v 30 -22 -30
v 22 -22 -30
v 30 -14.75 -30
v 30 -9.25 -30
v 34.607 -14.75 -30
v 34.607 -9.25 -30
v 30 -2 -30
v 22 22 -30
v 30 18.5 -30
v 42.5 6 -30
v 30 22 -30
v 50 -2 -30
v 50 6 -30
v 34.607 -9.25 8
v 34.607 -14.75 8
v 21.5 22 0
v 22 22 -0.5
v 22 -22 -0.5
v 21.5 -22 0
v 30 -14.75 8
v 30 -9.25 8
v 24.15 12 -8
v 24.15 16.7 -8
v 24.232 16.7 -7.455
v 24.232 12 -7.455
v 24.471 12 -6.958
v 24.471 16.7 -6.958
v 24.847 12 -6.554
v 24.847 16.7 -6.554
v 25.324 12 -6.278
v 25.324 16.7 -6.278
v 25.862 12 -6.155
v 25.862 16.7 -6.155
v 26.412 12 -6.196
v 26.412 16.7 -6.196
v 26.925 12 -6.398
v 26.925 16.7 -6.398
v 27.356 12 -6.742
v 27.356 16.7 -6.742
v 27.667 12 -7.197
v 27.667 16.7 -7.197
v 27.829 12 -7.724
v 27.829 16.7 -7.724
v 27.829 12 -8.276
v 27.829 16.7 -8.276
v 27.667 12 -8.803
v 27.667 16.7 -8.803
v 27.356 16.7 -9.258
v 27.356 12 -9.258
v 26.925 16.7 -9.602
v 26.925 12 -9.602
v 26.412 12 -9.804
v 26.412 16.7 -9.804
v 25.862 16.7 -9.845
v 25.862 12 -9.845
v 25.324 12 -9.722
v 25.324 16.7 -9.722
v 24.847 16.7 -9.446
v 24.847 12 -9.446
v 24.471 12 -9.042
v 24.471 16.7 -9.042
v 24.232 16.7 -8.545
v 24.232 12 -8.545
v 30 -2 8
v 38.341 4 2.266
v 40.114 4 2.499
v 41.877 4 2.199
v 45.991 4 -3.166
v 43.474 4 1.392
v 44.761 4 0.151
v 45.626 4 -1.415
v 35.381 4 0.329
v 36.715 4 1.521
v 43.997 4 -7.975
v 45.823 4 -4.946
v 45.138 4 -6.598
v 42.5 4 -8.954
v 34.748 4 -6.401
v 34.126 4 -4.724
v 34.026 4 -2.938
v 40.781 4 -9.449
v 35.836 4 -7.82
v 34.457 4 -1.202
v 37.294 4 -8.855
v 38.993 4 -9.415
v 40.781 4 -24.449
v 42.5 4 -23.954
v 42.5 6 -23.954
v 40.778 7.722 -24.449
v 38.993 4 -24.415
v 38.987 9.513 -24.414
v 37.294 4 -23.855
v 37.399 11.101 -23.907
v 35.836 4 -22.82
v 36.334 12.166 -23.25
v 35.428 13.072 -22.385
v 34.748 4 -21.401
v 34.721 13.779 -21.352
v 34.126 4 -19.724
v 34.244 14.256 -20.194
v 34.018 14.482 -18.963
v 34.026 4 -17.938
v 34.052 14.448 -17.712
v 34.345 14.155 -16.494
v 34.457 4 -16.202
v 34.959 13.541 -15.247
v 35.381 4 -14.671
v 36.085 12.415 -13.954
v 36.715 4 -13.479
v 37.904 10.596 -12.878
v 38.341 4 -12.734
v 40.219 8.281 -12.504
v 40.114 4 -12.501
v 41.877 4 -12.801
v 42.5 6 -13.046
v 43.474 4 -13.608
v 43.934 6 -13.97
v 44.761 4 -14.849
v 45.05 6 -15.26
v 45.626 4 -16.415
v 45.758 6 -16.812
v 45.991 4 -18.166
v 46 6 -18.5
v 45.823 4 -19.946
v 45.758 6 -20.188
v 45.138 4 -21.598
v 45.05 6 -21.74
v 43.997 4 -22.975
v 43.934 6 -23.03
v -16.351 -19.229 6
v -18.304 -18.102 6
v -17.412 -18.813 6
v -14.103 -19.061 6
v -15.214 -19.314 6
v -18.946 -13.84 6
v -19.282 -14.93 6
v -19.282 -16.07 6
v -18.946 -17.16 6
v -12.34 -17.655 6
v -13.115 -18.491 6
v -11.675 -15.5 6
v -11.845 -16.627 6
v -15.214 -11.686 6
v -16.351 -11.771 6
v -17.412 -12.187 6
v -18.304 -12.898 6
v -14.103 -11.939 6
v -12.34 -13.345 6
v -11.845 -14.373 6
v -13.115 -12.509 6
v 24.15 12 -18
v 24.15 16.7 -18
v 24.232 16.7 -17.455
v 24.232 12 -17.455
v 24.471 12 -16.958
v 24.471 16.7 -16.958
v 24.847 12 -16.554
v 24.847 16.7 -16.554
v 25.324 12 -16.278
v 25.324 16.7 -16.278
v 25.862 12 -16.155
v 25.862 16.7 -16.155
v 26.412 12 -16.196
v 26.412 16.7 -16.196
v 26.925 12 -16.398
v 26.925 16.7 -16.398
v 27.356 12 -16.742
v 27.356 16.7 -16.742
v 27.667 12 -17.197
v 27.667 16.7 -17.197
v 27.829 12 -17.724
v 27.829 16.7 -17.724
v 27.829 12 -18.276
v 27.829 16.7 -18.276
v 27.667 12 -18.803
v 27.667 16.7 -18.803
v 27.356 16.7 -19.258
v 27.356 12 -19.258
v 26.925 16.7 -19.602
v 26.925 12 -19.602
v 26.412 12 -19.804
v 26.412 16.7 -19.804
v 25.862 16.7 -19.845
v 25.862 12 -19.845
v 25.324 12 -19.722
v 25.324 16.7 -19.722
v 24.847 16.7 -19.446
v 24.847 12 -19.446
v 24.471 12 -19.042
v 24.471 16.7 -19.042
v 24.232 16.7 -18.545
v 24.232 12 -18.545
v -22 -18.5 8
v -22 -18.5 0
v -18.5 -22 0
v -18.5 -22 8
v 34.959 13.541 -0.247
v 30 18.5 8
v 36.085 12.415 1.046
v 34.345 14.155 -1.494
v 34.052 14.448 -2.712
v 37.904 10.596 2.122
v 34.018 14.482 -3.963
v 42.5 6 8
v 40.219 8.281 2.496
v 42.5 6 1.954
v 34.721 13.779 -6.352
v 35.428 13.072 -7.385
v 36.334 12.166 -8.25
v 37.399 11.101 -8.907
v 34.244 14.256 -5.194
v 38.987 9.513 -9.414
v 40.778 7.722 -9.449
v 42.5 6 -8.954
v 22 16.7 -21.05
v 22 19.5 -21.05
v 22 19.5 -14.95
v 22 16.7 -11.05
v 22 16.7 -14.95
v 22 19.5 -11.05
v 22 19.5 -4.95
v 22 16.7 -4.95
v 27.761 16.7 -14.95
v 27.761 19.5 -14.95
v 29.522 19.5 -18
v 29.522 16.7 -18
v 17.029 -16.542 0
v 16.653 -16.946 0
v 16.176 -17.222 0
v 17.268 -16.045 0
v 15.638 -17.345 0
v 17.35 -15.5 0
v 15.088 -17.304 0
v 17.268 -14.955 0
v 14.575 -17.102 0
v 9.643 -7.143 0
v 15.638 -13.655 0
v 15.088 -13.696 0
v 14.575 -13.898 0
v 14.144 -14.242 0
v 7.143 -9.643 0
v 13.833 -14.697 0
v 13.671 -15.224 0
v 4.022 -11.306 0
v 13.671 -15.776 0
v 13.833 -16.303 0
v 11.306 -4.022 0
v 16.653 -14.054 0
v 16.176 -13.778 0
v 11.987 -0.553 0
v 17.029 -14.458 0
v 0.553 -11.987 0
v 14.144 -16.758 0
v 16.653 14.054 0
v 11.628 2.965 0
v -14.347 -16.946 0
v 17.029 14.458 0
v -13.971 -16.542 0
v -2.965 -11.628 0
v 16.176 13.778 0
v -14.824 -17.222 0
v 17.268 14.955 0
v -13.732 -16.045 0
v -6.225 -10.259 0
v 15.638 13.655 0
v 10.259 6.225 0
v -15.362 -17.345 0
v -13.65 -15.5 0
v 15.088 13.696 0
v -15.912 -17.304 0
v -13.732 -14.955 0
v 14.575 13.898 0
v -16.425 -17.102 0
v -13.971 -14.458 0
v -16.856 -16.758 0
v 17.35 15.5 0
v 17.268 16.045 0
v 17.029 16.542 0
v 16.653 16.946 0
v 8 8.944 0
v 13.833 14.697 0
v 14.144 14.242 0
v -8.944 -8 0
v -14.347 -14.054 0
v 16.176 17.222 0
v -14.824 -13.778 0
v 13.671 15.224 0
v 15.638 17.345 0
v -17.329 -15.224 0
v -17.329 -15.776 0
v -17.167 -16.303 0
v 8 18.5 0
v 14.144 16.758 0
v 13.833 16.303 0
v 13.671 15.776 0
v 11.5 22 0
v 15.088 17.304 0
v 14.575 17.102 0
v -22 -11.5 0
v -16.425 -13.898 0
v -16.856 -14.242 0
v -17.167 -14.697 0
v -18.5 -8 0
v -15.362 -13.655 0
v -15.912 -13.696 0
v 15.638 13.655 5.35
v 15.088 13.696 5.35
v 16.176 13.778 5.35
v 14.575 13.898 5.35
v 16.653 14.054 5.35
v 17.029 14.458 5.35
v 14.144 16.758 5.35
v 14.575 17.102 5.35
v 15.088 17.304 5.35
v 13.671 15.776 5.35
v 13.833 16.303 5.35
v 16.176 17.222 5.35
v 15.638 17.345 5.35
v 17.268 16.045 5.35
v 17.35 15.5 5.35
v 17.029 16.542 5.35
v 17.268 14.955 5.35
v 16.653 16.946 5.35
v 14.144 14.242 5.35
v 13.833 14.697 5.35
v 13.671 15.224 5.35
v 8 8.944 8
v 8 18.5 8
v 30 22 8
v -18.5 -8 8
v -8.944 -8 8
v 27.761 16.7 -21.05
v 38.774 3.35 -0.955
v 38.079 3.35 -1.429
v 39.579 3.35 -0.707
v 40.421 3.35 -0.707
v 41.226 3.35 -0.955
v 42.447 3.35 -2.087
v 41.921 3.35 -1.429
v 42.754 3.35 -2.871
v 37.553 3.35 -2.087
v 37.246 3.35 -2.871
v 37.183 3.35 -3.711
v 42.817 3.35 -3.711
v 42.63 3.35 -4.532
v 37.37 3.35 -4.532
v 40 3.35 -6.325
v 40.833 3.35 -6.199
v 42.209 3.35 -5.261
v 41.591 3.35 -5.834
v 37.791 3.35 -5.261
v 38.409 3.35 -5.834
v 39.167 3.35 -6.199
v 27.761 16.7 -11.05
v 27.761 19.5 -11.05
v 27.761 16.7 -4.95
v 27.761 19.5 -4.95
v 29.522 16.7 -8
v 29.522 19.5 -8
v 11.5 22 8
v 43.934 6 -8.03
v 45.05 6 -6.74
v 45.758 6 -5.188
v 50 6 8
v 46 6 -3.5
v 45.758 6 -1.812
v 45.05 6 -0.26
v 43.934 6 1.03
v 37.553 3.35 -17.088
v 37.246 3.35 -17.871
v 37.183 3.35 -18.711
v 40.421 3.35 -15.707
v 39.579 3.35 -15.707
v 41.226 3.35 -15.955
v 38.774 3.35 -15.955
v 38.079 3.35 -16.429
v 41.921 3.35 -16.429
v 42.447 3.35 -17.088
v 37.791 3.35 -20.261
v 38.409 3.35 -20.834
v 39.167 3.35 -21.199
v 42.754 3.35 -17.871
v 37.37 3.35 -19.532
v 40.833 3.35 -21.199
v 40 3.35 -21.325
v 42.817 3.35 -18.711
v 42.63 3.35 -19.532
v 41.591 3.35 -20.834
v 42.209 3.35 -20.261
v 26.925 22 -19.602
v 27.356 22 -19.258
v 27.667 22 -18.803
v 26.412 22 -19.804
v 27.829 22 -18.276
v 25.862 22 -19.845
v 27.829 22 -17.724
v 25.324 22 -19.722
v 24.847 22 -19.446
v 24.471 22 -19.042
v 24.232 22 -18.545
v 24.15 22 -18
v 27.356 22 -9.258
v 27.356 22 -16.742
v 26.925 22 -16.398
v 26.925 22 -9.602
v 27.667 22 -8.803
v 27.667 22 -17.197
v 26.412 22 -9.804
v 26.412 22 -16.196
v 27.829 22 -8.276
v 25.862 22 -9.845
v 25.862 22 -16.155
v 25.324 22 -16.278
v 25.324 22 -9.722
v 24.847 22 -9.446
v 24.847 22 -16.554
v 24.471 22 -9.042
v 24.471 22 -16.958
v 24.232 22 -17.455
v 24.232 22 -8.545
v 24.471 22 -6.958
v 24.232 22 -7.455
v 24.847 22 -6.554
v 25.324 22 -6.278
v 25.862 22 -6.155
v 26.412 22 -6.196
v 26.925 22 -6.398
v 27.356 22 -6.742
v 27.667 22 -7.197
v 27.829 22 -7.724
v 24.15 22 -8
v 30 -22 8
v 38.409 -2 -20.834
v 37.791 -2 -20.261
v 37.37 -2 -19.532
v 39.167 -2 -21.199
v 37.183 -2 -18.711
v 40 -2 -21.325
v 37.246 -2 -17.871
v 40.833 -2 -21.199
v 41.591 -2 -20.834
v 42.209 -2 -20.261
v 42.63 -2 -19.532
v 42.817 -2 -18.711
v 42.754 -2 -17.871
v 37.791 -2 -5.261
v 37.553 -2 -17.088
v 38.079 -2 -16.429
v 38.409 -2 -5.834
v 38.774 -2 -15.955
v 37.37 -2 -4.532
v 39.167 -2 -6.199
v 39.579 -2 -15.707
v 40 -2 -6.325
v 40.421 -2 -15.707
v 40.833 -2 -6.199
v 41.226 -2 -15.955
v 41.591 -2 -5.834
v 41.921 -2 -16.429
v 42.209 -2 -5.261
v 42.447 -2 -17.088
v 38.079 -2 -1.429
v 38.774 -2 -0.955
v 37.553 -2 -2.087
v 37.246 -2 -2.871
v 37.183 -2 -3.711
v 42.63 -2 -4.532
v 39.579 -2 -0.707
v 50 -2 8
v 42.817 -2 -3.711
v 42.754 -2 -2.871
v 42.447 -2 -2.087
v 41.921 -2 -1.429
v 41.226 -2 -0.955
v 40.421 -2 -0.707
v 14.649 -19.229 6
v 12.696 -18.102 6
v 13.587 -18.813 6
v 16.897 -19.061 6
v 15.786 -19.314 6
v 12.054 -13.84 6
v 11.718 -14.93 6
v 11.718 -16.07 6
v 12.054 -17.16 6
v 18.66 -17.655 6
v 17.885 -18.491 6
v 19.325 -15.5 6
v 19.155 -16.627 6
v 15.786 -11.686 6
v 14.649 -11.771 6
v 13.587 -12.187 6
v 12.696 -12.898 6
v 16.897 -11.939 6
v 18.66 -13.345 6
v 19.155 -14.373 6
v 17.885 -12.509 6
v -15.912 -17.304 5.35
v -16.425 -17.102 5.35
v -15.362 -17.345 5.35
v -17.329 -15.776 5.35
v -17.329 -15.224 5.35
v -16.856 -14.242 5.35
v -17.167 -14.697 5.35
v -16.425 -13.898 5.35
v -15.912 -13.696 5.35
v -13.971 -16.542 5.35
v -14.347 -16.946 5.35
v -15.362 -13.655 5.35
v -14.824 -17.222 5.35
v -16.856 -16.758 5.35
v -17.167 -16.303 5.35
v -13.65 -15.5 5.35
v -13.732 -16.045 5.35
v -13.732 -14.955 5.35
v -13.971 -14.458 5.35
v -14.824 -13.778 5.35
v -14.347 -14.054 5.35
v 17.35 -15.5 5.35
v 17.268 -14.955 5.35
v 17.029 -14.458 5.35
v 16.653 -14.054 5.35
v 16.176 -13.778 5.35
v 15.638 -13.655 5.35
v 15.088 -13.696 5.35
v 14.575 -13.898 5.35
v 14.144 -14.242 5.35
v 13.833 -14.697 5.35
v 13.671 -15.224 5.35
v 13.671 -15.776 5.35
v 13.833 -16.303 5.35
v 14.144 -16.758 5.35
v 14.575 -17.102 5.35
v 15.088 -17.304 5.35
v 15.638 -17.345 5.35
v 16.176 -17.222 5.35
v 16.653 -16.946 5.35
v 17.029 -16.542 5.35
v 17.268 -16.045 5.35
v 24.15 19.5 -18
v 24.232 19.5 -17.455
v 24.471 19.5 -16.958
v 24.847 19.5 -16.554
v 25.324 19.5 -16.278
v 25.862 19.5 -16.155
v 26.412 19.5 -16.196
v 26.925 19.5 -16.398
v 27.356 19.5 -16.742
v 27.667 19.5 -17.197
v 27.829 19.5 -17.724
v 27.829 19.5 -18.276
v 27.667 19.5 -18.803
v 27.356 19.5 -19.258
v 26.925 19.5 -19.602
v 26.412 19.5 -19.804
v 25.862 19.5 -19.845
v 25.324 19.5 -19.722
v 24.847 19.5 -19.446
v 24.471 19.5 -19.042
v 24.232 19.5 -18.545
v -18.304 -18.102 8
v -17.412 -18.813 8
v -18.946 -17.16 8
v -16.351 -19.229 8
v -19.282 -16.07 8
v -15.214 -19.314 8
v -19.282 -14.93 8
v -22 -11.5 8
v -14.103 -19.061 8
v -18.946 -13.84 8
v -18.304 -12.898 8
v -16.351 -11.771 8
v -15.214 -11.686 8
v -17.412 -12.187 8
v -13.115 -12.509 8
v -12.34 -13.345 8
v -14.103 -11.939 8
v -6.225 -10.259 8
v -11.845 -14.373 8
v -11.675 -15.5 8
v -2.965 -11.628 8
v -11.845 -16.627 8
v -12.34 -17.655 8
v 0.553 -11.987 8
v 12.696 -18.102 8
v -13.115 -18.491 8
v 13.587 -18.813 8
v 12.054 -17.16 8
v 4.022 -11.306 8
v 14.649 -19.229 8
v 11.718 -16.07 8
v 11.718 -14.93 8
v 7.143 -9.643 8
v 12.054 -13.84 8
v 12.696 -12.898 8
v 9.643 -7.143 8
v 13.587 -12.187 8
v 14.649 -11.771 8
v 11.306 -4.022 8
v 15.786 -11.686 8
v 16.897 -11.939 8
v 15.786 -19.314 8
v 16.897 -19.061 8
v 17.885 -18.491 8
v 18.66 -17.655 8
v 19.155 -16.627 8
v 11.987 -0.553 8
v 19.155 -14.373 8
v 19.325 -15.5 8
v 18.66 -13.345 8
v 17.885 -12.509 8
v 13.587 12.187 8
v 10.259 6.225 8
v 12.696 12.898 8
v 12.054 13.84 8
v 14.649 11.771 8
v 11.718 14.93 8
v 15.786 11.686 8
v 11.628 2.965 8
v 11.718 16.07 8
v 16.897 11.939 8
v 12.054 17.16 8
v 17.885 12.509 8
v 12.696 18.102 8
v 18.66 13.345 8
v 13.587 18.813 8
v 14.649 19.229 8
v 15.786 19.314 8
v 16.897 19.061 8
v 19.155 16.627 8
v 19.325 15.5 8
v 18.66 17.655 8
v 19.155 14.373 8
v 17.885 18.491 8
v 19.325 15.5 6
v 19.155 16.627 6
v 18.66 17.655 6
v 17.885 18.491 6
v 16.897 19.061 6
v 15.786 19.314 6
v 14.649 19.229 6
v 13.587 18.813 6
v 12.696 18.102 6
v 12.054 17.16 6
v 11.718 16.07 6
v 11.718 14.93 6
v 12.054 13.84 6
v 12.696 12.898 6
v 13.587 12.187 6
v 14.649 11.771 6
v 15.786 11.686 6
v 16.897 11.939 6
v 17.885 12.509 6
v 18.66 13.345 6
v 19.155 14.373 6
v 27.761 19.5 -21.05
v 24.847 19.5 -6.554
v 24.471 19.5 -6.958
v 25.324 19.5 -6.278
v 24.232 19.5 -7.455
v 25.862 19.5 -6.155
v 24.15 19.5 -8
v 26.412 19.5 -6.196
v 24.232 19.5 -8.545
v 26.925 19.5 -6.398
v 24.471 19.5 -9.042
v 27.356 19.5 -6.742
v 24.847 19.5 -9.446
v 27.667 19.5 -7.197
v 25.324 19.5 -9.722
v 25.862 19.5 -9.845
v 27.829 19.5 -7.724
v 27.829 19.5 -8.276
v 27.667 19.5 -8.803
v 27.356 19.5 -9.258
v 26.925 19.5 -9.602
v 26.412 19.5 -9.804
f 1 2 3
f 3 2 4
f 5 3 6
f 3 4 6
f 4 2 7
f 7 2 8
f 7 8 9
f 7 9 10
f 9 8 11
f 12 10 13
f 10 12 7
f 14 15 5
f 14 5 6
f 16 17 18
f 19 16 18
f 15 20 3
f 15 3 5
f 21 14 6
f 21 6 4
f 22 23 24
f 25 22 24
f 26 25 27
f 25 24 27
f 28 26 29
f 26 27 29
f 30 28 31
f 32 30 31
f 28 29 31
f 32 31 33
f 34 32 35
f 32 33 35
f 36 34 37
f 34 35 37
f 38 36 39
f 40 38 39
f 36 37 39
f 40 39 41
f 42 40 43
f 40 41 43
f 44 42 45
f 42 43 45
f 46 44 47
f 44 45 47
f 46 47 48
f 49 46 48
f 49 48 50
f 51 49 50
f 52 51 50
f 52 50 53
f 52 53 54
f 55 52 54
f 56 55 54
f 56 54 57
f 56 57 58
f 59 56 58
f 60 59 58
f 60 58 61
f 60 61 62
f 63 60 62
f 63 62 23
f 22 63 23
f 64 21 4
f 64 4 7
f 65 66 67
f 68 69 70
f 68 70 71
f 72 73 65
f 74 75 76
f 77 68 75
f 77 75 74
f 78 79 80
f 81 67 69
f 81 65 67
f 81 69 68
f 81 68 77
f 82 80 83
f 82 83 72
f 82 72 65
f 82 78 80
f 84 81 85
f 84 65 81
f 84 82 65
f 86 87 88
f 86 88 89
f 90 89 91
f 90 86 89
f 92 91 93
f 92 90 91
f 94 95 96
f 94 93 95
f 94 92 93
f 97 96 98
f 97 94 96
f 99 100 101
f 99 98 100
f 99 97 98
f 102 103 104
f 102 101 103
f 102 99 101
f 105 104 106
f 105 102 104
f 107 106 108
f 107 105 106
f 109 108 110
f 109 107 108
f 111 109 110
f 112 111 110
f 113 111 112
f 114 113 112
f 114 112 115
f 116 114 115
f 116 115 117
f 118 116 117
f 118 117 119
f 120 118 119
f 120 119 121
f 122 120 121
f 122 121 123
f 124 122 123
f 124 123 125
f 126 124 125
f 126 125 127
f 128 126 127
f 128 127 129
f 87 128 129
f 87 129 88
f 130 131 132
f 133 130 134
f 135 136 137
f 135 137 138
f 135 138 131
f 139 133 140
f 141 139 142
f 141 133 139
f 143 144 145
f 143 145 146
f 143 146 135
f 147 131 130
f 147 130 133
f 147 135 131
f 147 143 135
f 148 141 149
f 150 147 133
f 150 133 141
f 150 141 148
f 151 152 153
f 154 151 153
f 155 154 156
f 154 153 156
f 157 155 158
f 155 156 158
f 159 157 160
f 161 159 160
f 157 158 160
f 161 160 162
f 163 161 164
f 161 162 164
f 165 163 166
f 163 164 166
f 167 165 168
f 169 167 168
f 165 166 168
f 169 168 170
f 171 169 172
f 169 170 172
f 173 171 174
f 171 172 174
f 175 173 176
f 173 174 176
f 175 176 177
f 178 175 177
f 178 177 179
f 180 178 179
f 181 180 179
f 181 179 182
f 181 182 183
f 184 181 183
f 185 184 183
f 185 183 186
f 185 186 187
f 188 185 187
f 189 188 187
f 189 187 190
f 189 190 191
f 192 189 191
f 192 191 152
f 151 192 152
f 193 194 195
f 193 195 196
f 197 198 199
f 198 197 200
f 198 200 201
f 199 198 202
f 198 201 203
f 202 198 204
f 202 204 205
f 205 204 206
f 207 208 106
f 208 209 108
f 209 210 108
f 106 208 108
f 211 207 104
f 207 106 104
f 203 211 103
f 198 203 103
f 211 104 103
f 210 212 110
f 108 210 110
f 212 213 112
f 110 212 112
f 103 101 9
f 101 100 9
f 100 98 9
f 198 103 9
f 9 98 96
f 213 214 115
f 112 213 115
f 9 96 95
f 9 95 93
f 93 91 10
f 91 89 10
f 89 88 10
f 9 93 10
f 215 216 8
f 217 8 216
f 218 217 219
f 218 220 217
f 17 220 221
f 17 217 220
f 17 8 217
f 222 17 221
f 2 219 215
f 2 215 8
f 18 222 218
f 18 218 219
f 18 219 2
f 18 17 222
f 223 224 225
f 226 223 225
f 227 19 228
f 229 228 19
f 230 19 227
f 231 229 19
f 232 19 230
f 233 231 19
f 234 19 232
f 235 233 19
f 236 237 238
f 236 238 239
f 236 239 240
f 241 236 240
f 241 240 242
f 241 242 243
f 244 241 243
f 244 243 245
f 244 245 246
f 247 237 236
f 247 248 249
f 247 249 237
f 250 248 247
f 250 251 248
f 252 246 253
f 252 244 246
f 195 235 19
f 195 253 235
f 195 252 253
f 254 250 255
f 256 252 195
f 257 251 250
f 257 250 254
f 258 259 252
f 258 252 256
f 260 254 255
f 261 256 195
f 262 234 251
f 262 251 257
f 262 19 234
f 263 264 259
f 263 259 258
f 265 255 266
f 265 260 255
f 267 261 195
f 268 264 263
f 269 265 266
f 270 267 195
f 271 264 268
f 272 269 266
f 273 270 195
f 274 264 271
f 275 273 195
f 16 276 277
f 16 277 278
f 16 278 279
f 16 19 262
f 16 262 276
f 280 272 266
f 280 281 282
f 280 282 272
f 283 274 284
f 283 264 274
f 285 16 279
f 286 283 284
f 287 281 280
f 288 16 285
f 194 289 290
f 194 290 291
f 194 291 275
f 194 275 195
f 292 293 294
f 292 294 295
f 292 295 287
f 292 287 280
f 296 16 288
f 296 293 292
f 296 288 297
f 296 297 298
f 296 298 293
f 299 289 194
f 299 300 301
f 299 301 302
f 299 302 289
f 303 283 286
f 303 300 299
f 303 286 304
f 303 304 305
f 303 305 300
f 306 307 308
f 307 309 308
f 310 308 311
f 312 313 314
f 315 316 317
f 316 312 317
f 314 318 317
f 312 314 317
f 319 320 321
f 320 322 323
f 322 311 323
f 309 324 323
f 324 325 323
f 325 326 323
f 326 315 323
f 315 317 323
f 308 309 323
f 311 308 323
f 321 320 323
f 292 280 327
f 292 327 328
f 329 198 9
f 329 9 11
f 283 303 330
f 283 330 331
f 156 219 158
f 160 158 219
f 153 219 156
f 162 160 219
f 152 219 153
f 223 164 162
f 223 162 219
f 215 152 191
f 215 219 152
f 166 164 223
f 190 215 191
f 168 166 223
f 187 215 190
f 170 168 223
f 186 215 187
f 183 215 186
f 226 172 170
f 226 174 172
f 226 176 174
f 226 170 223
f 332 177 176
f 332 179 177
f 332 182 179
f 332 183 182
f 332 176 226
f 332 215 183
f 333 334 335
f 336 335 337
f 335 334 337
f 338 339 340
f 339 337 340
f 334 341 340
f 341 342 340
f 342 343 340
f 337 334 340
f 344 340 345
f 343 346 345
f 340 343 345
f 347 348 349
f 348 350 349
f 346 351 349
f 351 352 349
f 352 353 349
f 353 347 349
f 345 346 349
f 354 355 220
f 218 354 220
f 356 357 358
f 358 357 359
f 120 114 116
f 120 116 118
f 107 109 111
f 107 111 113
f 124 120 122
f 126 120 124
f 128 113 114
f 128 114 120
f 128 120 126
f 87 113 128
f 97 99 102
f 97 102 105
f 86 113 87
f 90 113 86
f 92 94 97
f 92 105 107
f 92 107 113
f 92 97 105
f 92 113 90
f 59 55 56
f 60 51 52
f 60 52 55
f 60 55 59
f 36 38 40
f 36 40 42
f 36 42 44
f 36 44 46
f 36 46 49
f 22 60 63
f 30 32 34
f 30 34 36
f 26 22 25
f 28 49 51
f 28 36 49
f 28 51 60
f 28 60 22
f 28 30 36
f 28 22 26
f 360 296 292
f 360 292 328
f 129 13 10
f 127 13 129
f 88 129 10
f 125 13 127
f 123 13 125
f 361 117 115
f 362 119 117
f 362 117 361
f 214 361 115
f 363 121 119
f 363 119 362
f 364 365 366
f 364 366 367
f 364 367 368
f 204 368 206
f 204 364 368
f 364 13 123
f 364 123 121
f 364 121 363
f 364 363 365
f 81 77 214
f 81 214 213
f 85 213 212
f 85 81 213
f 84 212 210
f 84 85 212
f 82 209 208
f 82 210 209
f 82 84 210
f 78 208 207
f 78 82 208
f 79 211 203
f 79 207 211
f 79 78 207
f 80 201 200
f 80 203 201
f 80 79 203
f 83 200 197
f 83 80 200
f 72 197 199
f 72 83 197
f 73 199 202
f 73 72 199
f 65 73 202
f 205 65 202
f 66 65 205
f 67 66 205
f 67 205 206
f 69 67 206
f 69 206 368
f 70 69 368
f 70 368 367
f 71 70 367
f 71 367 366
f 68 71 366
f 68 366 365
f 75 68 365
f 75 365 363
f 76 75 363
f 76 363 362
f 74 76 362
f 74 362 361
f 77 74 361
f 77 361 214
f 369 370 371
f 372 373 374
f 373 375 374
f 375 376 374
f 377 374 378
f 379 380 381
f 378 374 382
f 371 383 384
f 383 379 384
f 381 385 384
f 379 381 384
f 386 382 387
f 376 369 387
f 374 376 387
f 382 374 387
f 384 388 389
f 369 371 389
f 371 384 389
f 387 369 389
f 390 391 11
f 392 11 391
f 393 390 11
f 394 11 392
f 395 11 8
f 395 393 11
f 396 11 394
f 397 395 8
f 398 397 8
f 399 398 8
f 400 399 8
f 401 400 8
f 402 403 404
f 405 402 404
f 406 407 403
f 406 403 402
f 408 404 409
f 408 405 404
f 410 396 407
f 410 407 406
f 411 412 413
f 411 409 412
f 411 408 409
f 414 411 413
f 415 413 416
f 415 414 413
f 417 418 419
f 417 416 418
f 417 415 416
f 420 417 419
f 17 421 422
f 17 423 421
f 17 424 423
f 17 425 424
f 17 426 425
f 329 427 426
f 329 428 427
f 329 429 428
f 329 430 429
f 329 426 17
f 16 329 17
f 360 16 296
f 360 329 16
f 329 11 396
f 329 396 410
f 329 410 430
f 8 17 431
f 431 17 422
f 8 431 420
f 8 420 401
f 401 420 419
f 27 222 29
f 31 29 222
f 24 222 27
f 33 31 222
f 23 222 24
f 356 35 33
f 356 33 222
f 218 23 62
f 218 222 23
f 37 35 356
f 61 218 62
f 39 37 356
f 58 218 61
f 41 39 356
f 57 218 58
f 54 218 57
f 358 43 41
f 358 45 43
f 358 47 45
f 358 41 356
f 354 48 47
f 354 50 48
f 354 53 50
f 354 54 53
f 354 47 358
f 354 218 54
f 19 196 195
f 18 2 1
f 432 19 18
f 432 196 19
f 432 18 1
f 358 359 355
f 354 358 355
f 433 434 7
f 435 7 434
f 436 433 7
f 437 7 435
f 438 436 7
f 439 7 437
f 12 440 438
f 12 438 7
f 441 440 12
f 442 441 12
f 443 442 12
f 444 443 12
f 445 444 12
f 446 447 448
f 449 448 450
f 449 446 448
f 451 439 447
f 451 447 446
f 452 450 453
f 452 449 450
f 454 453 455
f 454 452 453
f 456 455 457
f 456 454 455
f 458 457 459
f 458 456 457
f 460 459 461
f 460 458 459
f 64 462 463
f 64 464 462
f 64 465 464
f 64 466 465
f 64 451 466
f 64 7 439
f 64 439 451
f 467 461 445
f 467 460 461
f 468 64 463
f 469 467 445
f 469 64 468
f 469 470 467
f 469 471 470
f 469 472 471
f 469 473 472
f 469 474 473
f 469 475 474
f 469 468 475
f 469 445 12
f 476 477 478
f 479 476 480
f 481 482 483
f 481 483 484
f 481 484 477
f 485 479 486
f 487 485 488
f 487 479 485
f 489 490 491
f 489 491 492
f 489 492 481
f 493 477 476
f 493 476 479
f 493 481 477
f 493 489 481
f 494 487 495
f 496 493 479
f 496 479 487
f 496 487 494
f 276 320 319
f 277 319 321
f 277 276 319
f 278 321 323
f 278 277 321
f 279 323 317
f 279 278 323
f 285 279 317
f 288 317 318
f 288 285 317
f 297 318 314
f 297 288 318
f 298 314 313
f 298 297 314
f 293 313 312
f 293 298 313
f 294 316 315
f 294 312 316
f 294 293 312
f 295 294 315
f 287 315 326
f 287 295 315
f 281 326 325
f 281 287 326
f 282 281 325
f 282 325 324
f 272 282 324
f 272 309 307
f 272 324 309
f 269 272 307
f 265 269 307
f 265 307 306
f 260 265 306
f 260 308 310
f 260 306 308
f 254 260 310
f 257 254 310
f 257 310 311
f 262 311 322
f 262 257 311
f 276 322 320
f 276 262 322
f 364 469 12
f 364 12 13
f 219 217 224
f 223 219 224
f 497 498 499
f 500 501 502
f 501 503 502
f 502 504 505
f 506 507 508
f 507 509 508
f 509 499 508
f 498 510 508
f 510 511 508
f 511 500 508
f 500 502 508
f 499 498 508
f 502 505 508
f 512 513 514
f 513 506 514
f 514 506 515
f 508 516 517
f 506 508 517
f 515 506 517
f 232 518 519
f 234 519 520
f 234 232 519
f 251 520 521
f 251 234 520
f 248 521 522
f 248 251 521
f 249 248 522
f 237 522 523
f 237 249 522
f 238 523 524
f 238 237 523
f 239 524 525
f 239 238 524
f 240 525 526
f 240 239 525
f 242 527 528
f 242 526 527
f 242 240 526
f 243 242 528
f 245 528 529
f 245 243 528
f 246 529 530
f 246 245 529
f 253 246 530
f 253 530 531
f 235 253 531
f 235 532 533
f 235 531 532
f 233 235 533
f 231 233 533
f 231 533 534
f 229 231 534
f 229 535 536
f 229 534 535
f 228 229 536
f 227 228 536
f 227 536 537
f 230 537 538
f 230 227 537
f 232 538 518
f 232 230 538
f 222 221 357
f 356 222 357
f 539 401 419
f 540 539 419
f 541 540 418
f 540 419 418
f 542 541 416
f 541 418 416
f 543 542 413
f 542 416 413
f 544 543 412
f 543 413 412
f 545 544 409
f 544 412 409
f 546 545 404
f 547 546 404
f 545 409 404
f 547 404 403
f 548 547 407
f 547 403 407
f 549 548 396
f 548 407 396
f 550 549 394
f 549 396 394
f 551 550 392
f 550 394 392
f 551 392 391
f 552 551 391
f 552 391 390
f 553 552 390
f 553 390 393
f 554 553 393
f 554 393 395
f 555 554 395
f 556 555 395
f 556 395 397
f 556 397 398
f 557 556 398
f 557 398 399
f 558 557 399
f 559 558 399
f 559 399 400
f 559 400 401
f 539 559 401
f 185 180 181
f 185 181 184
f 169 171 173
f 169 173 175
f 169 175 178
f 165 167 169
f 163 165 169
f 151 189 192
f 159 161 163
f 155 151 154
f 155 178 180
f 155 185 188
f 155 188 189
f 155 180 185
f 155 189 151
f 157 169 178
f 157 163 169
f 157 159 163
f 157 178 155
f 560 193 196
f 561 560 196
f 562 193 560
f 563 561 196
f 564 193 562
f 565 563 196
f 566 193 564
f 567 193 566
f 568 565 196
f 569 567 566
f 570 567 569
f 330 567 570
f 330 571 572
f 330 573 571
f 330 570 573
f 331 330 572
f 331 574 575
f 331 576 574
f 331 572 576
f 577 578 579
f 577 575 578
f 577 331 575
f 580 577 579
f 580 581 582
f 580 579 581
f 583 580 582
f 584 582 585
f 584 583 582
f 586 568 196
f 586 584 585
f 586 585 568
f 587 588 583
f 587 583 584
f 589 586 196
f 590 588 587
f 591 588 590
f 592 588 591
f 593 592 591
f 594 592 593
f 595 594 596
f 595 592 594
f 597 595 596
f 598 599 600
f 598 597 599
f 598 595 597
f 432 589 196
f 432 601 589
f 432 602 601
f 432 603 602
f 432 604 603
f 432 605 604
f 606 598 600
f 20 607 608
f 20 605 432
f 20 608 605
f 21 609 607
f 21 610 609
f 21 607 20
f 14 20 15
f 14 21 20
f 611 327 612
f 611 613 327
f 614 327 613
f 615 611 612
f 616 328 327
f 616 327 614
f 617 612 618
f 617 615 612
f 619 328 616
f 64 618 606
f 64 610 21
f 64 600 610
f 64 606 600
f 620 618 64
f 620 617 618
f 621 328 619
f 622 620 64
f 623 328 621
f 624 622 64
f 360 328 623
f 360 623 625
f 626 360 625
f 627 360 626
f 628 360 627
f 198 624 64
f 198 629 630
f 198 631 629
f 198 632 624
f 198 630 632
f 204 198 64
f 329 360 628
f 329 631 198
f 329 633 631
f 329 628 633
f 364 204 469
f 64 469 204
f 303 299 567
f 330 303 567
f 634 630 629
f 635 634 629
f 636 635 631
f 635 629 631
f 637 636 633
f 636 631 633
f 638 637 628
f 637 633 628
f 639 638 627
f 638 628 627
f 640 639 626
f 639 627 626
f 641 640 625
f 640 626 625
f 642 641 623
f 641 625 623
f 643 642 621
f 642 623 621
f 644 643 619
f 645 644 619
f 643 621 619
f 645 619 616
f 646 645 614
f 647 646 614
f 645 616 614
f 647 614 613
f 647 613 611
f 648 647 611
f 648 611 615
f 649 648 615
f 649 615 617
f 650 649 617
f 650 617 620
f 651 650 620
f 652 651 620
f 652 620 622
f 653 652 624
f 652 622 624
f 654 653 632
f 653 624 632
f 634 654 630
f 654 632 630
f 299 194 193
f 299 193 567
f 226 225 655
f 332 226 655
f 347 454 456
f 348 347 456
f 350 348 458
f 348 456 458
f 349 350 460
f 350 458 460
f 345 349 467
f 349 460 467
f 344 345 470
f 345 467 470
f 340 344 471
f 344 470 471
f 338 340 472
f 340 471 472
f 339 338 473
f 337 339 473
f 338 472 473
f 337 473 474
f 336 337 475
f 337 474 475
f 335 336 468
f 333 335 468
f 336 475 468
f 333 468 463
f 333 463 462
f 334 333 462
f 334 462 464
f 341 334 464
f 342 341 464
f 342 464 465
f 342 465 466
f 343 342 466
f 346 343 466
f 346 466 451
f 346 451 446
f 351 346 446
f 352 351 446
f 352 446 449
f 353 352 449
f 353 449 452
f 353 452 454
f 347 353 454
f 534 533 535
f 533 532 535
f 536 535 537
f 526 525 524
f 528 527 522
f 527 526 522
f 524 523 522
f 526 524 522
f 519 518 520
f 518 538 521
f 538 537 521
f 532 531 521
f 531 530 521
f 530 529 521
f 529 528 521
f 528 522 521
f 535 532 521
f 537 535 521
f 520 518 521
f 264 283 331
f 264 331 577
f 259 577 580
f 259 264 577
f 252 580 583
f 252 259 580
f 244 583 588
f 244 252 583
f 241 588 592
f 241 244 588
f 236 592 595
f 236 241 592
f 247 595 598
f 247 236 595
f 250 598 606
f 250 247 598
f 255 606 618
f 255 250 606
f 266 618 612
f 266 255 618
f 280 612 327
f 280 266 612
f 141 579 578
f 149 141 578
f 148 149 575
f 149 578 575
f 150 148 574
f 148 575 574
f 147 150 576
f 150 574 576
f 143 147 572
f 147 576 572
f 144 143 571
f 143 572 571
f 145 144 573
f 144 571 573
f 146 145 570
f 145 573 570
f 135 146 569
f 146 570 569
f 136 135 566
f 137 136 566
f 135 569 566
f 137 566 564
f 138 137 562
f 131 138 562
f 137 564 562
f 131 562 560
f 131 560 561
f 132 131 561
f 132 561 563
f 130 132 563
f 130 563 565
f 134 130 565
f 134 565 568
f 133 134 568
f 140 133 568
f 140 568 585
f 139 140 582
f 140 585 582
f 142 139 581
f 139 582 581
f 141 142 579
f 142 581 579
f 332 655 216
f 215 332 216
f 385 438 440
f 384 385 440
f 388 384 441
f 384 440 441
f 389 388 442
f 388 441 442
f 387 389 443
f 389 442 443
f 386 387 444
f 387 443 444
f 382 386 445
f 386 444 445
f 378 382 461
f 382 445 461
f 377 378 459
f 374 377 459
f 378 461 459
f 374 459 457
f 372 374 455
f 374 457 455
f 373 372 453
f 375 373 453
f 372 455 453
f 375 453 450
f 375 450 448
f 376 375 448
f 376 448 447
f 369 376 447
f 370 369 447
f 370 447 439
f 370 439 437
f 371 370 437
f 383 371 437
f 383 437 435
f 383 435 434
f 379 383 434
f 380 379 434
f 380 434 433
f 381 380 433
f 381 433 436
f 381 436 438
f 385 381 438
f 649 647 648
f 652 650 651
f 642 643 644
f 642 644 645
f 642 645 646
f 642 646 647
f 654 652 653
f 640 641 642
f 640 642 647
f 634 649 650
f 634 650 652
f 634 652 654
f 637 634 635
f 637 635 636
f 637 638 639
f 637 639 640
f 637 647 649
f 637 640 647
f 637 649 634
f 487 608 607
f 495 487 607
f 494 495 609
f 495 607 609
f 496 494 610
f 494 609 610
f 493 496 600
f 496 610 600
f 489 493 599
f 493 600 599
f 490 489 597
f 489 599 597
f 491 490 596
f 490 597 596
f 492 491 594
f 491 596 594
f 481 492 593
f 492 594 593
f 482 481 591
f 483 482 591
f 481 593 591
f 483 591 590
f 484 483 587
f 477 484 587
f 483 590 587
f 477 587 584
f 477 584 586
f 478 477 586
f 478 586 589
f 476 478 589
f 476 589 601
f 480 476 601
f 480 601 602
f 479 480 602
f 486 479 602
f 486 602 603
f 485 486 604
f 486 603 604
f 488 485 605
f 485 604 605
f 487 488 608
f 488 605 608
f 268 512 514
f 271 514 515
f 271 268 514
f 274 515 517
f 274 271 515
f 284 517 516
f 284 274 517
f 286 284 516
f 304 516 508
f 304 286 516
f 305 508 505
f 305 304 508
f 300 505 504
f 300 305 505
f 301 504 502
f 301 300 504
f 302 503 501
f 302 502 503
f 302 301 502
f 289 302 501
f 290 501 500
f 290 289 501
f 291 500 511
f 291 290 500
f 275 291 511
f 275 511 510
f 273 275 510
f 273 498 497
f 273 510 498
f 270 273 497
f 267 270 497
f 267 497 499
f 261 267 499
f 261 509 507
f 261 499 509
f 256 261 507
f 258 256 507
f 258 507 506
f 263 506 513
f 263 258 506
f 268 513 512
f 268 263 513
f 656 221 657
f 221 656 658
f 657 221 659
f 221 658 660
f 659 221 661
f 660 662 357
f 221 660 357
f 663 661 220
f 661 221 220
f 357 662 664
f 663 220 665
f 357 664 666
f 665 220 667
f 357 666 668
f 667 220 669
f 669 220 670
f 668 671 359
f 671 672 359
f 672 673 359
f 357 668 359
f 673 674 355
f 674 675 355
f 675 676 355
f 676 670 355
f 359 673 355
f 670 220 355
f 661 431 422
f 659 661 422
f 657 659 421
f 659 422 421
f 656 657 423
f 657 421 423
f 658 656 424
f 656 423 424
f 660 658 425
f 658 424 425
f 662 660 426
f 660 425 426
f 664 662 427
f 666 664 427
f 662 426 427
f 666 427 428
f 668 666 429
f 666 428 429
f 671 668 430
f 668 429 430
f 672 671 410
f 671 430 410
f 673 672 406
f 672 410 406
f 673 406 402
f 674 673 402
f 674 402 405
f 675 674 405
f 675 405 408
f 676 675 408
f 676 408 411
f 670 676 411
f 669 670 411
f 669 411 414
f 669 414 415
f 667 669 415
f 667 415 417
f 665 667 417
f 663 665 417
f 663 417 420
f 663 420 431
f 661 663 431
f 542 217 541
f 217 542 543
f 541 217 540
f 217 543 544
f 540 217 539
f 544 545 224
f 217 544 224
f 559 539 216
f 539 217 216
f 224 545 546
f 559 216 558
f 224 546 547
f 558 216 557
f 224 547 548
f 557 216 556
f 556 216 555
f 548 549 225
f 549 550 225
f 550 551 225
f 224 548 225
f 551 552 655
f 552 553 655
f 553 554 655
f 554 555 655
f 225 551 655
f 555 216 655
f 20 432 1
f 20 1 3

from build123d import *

# Parameters (mm, degrees)
SKETCH1_R           = 1.85
BOSS_EXTRUDE1_DEPTH = 8
BOSS_EXTRUDE3_DEPTH = 38
CHAMFER1_SIZE       = 3.5
CHAMFER2_SIZE       = 12.5
SKETCH4_R           = 2.825
CUT_EXTRUDE1_DEPTH  = 15
CUT_EXTRUDE2_START  = -2
SKETCH5_R           = 6
CUT_EXTRUDE2_DEPTH  = 15
CHAMFER3_SIZE       = 0.5
SKETCH6_R           = 3.825
CUT_EXTRUDE3_DEPTH  = 2
SKETCH10_R          = 1.85
CUT_EXTRUDE6_DEPTH  = 10
CUT_EXTRUDE7_START  = -2.5
CUT_EXTRUDE7_DEPTH  = 2.8
SKETCH12_R          = 3.940095522
SKETCH12_R_2        = 4.765678208
PRINT_HELPER_DEPTH  = 0.65
SKETCH7_R           = 2.546325066
SKETCH7_R_2         = 2.762394701
SKETCH7_R_3         = 2.98597441
PRINT_HELPER1_DEPTH = 0.65


with BuildPart() as part:
    # Sketch1 → Boss-Extrude1 (new body)
    with BuildSketch(Plane.XY):
        with BuildLine():
            ThreePointArc((-8.94427191, -8), (8.485281374, -8.485281374), (8, 8.94427191))
            Line((8, 8.94427191), (8, 22))
            Line((8, 22), (22, 22))
            Line((22, 22), (22, -22))
            Line((22, -22), (-22, -22))
            Line((-22, -22), (-22, -8))
            Line((-22, -8), (-8.94427191, -8))
        make_face()
        with Locations((-15.5, -15.5)):
            Circle(SKETCH1_R, mode=Mode.SUBTRACT)
        with Locations((15.5, -15.5)):
            Circle(SKETCH1_R, mode=Mode.SUBTRACT)
        with Locations((15.5, 15.5)):
            Circle(SKETCH1_R, mode=Mode.SUBTRACT)
    extrude(amount=BOSS_EXTRUDE1_DEPTH)

    # Sketch3 → Boss-Extrude3 (add)
    with BuildSketch(Plane.XY.offset(8)):
        Polygon((30, -9.25), (30, -2), (50, -2), (50, 6), (30, 6), (30, 22), (22, 22), (22, 6), (22, -22), (30, -22), (30, -14.75), (34.606555482, -14.75), (34.606555482, -9.25), align=None)
    extrude(amount=-BOSS_EXTRUDE3_DEPTH)

    # Chamfer1
    chamfer1_edges = [part.edges().sort_by_distance(p)[0] for p in [
        (8, 22, 4),
        (-22, -22, 4),
        (-22, -8, 4),
    ]]
    chamfer(chamfer1_edges, length=CHAMFER1_SIZE)

    # Chamfer2
    chamfer2_edges = [part.edges().sort_by_distance(p)[0] for p in [
        (30, 6, -11),
    ]]
    chamfer(chamfer2_edges, length=CHAMFER2_SIZE)

    # Sketch4 → Cut-Extrude1 (cut)
    with BuildSketch(Plane.XZ.offset(2)):
        with Locations(Location((40, -3.5, 0), (0, 0, 270))):
            Circle(SKETCH4_R)
        with Locations(Location((40, -18.5, 0), (0, 0, 270))):
            Circle(SKETCH4_R)
    extrude(amount=-CUT_EXTRUDE1_DEPTH, mode=Mode.SUBTRACT)

    # Sketch5 → Cut-Extrude2 (cut)
    with BuildSketch(Plane(origin=(0, 6, 0), x_dir=(1, 0, 0), z_dir=(0, 1, 0)).offset(CUT_EXTRUDE2_START)):
        with Locations(Location((40, 18.5, 0), (0, 0, 65.375681648))):
            Circle(SKETCH5_R)
        with Locations(Location((40, 3.5, 0), (0, 0, 65.375681648))):
            Circle(SKETCH5_R)
    extrude(amount=CUT_EXTRUDE2_DEPTH, mode=Mode.SUBTRACT)

    # Chamfer3
    chamfer3_edges = [part.edges().sort_by_distance(p)[0] for p in [
        (22, 0, 0),
    ]]
    chamfer(chamfer3_edges, length=CHAMFER3_SIZE)

    # Sketch6 → Cut-Extrude3 (cut)
    with BuildSketch(Plane.XY.offset(8)):
        with Locations((15.5, 15.5)):
            Circle(SKETCH6_R)
        with Locations((15.5, -15.5)):
            Circle(SKETCH6_R)
        with Locations((-15.5, -15.5)):
            Circle(SKETCH6_R)
    extrude(amount=-CUT_EXTRUDE3_DEPTH, mode=Mode.SUBTRACT)

    # Sketch10 → Cut-Extrude6 (cut)
    with BuildSketch(Plane(origin=(0, 22, 0), x_dir=(1, 0, 0), z_dir=(0, 1, 0))):
        with Locations(Location((26, 8, 0), (0, 0, 180))):
            Circle(SKETCH10_R)
        with Locations(Location((26, 18, 0), (0, 0, 180))):
            Circle(SKETCH10_R)
    extrude(amount=-CUT_EXTRUDE6_DEPTH, mode=Mode.SUBTRACT)

    # Sketch11 → Cut-Extrude7 (cut)
    with BuildSketch(Plane(origin=(0, 22, 0), x_dir=(1, 0, 0), z_dir=(0, 1, 0)).offset(CUT_EXTRUDE7_START)):
        Polygon((24.239081679, 14.95), (27.760918321, 14.95), (29.521836642, 18), (27.760918321, 21.05), (24.239081679, 21.05), (20.488418147, 21.05), (20.488418147, 14.95), align=None)
        Polygon((24.239081679, 4.95), (27.760918321, 4.95), (29.521836642, 8), (27.760918321, 11.05), (24.239081679, 11.05), (20.488418147, 11.05), (20.488418147, 4.95), align=None)
    extrude(amount=-CUT_EXTRUDE7_DEPTH, mode=Mode.SUBTRACT)

    # Sketch12 → print_helper (add)
    with BuildSketch(Plane(origin=(0, 4, 0), x_dir=(1, 0, 0), z_dir=(0, 1, 0))):
        with Locations((40, 3.5)):
            Circle(SKETCH12_R)
        with Locations((40, 18.5)):
            Circle(SKETCH12_R_2)
    extrude(amount=-PRINT_HELPER_DEPTH)

    # Sketch7 → print_helper1 (add)
    with BuildSketch(Plane.XY.offset(6)):
        with Locations((15.5, 15.5)):
            Circle(SKETCH7_R)
        with Locations((15.5, -15.5)):
            Circle(SKETCH7_R_2)
        with Locations((-15.5, -15.5)):
            Circle(SKETCH7_R_3)
    extrude(amount=-PRINT_HELPER1_DEPTH)


solid = part.part
